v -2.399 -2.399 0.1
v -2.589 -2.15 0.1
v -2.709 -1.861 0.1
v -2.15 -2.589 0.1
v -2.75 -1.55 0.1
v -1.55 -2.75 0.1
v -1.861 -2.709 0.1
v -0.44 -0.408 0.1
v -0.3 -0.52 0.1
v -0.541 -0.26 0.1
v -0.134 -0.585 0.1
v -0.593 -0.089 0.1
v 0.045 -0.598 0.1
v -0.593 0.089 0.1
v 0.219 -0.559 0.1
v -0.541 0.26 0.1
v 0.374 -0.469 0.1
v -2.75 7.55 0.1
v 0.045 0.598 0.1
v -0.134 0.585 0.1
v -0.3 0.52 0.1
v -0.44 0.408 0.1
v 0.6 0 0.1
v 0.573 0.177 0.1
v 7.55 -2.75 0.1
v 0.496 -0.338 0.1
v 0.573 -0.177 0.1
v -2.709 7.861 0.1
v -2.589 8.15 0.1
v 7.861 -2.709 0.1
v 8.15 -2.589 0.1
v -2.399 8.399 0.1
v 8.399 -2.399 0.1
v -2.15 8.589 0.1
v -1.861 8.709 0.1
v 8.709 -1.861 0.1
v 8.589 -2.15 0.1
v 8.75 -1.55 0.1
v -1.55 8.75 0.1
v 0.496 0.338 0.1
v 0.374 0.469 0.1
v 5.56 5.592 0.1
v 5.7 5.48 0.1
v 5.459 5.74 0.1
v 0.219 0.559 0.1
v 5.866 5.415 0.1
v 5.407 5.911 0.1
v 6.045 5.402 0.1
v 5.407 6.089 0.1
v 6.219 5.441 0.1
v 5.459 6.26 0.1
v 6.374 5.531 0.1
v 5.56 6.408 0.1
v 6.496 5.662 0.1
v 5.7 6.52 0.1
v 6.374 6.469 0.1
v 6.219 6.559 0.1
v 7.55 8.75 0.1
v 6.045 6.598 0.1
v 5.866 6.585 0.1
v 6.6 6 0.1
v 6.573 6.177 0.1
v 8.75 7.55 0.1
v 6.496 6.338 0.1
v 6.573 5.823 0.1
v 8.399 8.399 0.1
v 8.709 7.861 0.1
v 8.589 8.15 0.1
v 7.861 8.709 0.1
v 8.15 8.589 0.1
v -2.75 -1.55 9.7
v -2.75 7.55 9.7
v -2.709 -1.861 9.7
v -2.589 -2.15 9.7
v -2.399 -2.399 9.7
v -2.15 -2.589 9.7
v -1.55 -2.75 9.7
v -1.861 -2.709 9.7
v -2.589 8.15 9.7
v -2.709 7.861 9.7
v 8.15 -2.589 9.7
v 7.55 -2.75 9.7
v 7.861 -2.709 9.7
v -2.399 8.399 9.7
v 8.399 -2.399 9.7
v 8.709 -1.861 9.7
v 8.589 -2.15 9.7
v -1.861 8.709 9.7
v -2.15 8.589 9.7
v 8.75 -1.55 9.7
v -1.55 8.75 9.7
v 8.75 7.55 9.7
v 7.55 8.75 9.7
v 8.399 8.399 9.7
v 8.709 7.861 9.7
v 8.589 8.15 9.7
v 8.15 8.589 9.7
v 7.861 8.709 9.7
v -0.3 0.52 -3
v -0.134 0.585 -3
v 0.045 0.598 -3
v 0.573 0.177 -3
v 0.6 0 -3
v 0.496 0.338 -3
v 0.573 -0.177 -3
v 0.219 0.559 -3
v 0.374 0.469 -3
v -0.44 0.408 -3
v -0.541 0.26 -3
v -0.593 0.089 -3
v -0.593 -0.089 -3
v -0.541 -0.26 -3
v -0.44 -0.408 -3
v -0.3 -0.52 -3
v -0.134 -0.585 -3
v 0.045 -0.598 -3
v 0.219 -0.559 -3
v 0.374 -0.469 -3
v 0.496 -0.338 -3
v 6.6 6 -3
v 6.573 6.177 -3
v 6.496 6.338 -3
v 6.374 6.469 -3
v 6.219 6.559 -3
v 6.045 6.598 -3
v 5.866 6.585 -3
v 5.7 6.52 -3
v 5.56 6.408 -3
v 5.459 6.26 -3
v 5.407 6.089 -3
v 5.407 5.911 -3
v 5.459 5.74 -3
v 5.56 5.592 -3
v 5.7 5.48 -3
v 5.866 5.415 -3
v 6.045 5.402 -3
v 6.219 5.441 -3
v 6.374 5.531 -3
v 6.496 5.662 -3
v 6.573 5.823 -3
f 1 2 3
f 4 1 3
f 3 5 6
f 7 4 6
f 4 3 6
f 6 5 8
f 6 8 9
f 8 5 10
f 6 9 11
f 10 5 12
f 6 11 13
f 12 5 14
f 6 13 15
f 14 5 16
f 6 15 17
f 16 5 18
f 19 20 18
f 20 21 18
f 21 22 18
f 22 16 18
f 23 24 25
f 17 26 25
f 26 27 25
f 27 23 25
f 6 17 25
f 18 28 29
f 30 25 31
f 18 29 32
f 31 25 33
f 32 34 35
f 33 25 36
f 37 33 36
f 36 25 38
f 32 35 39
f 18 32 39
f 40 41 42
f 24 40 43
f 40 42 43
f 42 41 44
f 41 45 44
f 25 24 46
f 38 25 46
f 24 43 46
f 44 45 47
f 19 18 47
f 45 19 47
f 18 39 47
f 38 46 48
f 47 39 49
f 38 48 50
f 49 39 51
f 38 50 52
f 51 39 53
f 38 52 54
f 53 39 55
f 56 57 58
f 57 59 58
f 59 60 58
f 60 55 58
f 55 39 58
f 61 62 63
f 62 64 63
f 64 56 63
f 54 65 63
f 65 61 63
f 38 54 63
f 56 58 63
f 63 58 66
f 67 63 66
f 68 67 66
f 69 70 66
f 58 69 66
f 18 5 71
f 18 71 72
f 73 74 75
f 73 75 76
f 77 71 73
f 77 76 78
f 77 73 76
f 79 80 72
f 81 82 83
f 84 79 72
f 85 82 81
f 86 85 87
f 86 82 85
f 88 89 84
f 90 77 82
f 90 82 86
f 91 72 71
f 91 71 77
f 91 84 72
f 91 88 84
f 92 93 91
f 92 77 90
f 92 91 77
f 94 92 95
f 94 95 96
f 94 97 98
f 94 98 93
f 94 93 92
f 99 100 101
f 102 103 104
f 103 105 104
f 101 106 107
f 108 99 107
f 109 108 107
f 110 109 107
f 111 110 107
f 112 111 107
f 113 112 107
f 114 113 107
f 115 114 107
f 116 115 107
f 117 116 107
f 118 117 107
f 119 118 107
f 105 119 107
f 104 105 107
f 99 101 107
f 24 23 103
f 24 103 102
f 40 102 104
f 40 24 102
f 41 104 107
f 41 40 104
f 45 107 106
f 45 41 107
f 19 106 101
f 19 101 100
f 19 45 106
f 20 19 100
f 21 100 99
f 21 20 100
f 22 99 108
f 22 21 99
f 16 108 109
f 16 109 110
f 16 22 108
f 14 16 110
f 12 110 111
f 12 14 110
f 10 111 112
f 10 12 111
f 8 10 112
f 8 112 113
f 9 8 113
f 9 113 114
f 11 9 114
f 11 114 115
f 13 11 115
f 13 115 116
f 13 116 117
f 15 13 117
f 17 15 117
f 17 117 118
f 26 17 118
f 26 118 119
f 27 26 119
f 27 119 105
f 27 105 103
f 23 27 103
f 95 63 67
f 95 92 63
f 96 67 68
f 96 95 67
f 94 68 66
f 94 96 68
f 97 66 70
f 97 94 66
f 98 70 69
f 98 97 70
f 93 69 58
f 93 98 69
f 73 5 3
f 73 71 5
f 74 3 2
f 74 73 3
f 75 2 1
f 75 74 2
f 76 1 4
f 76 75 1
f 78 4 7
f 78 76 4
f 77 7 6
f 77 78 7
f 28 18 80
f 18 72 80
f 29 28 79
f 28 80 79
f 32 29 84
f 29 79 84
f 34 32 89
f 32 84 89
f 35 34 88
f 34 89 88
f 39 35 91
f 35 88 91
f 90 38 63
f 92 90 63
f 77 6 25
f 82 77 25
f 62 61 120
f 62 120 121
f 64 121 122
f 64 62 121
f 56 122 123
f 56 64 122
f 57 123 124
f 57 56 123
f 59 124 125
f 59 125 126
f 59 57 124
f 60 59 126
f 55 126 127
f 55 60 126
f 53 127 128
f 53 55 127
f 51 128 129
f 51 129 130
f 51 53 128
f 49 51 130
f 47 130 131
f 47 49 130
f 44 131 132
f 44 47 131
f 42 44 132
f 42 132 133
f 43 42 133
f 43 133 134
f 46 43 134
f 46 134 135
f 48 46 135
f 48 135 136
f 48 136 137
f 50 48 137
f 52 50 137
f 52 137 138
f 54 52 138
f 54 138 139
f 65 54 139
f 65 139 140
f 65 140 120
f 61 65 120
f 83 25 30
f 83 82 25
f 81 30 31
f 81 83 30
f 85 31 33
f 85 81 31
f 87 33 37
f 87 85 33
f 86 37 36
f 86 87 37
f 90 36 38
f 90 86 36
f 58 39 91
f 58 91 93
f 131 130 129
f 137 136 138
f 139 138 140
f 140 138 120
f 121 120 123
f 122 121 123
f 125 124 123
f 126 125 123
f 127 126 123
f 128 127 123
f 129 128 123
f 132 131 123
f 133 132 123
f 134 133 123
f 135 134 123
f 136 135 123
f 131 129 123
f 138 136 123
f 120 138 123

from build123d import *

# Parameters (mm, degrees)
SKETCH001_R  = 0.6
PAD001_DEPTH = 3.5
SKETCH_W     = 11.5
SKETCH_H     = 11.5
PAD_DEPTH    = 9.6
FILLET_R     = 1.2


with BuildPart() as pad001:
    # Sketch001 → Pad001 (new body)
    with BuildSketch(Plane.XY.offset(0.5)):
        Circle(SKETCH001_R)
        with Locations((6, 6)):
            Circle(SKETCH001_R)
    extrude(amount=-PAD001_DEPTH)


with BuildPart() as fillet_mp_cp:
    # Sketch → Pad (new body)
    with BuildSketch(Plane.XY.offset(0.1)):
        with Locations((3, 3)):
            Rectangle(SKETCH_W, SKETCH_H)
    extrude(amount=PAD_DEPTH)

    # Fillet
    fillet_edges = [fillet_mp_cp.edges().sort_by_distance(p)[0] for p in [
        (8.75, -2.75, 4.9),
        (8.75, 8.75, 4.9),
        (-2.75, -2.75, 4.9),
        (-2.75, 8.75, 4.9),
    ]]
    fillet(fillet_edges, radius=FILLET_R)

    # Fillet_mp_cp: union Pad001
    add(pad001.part)


solid = fillet_mp_cp.part
